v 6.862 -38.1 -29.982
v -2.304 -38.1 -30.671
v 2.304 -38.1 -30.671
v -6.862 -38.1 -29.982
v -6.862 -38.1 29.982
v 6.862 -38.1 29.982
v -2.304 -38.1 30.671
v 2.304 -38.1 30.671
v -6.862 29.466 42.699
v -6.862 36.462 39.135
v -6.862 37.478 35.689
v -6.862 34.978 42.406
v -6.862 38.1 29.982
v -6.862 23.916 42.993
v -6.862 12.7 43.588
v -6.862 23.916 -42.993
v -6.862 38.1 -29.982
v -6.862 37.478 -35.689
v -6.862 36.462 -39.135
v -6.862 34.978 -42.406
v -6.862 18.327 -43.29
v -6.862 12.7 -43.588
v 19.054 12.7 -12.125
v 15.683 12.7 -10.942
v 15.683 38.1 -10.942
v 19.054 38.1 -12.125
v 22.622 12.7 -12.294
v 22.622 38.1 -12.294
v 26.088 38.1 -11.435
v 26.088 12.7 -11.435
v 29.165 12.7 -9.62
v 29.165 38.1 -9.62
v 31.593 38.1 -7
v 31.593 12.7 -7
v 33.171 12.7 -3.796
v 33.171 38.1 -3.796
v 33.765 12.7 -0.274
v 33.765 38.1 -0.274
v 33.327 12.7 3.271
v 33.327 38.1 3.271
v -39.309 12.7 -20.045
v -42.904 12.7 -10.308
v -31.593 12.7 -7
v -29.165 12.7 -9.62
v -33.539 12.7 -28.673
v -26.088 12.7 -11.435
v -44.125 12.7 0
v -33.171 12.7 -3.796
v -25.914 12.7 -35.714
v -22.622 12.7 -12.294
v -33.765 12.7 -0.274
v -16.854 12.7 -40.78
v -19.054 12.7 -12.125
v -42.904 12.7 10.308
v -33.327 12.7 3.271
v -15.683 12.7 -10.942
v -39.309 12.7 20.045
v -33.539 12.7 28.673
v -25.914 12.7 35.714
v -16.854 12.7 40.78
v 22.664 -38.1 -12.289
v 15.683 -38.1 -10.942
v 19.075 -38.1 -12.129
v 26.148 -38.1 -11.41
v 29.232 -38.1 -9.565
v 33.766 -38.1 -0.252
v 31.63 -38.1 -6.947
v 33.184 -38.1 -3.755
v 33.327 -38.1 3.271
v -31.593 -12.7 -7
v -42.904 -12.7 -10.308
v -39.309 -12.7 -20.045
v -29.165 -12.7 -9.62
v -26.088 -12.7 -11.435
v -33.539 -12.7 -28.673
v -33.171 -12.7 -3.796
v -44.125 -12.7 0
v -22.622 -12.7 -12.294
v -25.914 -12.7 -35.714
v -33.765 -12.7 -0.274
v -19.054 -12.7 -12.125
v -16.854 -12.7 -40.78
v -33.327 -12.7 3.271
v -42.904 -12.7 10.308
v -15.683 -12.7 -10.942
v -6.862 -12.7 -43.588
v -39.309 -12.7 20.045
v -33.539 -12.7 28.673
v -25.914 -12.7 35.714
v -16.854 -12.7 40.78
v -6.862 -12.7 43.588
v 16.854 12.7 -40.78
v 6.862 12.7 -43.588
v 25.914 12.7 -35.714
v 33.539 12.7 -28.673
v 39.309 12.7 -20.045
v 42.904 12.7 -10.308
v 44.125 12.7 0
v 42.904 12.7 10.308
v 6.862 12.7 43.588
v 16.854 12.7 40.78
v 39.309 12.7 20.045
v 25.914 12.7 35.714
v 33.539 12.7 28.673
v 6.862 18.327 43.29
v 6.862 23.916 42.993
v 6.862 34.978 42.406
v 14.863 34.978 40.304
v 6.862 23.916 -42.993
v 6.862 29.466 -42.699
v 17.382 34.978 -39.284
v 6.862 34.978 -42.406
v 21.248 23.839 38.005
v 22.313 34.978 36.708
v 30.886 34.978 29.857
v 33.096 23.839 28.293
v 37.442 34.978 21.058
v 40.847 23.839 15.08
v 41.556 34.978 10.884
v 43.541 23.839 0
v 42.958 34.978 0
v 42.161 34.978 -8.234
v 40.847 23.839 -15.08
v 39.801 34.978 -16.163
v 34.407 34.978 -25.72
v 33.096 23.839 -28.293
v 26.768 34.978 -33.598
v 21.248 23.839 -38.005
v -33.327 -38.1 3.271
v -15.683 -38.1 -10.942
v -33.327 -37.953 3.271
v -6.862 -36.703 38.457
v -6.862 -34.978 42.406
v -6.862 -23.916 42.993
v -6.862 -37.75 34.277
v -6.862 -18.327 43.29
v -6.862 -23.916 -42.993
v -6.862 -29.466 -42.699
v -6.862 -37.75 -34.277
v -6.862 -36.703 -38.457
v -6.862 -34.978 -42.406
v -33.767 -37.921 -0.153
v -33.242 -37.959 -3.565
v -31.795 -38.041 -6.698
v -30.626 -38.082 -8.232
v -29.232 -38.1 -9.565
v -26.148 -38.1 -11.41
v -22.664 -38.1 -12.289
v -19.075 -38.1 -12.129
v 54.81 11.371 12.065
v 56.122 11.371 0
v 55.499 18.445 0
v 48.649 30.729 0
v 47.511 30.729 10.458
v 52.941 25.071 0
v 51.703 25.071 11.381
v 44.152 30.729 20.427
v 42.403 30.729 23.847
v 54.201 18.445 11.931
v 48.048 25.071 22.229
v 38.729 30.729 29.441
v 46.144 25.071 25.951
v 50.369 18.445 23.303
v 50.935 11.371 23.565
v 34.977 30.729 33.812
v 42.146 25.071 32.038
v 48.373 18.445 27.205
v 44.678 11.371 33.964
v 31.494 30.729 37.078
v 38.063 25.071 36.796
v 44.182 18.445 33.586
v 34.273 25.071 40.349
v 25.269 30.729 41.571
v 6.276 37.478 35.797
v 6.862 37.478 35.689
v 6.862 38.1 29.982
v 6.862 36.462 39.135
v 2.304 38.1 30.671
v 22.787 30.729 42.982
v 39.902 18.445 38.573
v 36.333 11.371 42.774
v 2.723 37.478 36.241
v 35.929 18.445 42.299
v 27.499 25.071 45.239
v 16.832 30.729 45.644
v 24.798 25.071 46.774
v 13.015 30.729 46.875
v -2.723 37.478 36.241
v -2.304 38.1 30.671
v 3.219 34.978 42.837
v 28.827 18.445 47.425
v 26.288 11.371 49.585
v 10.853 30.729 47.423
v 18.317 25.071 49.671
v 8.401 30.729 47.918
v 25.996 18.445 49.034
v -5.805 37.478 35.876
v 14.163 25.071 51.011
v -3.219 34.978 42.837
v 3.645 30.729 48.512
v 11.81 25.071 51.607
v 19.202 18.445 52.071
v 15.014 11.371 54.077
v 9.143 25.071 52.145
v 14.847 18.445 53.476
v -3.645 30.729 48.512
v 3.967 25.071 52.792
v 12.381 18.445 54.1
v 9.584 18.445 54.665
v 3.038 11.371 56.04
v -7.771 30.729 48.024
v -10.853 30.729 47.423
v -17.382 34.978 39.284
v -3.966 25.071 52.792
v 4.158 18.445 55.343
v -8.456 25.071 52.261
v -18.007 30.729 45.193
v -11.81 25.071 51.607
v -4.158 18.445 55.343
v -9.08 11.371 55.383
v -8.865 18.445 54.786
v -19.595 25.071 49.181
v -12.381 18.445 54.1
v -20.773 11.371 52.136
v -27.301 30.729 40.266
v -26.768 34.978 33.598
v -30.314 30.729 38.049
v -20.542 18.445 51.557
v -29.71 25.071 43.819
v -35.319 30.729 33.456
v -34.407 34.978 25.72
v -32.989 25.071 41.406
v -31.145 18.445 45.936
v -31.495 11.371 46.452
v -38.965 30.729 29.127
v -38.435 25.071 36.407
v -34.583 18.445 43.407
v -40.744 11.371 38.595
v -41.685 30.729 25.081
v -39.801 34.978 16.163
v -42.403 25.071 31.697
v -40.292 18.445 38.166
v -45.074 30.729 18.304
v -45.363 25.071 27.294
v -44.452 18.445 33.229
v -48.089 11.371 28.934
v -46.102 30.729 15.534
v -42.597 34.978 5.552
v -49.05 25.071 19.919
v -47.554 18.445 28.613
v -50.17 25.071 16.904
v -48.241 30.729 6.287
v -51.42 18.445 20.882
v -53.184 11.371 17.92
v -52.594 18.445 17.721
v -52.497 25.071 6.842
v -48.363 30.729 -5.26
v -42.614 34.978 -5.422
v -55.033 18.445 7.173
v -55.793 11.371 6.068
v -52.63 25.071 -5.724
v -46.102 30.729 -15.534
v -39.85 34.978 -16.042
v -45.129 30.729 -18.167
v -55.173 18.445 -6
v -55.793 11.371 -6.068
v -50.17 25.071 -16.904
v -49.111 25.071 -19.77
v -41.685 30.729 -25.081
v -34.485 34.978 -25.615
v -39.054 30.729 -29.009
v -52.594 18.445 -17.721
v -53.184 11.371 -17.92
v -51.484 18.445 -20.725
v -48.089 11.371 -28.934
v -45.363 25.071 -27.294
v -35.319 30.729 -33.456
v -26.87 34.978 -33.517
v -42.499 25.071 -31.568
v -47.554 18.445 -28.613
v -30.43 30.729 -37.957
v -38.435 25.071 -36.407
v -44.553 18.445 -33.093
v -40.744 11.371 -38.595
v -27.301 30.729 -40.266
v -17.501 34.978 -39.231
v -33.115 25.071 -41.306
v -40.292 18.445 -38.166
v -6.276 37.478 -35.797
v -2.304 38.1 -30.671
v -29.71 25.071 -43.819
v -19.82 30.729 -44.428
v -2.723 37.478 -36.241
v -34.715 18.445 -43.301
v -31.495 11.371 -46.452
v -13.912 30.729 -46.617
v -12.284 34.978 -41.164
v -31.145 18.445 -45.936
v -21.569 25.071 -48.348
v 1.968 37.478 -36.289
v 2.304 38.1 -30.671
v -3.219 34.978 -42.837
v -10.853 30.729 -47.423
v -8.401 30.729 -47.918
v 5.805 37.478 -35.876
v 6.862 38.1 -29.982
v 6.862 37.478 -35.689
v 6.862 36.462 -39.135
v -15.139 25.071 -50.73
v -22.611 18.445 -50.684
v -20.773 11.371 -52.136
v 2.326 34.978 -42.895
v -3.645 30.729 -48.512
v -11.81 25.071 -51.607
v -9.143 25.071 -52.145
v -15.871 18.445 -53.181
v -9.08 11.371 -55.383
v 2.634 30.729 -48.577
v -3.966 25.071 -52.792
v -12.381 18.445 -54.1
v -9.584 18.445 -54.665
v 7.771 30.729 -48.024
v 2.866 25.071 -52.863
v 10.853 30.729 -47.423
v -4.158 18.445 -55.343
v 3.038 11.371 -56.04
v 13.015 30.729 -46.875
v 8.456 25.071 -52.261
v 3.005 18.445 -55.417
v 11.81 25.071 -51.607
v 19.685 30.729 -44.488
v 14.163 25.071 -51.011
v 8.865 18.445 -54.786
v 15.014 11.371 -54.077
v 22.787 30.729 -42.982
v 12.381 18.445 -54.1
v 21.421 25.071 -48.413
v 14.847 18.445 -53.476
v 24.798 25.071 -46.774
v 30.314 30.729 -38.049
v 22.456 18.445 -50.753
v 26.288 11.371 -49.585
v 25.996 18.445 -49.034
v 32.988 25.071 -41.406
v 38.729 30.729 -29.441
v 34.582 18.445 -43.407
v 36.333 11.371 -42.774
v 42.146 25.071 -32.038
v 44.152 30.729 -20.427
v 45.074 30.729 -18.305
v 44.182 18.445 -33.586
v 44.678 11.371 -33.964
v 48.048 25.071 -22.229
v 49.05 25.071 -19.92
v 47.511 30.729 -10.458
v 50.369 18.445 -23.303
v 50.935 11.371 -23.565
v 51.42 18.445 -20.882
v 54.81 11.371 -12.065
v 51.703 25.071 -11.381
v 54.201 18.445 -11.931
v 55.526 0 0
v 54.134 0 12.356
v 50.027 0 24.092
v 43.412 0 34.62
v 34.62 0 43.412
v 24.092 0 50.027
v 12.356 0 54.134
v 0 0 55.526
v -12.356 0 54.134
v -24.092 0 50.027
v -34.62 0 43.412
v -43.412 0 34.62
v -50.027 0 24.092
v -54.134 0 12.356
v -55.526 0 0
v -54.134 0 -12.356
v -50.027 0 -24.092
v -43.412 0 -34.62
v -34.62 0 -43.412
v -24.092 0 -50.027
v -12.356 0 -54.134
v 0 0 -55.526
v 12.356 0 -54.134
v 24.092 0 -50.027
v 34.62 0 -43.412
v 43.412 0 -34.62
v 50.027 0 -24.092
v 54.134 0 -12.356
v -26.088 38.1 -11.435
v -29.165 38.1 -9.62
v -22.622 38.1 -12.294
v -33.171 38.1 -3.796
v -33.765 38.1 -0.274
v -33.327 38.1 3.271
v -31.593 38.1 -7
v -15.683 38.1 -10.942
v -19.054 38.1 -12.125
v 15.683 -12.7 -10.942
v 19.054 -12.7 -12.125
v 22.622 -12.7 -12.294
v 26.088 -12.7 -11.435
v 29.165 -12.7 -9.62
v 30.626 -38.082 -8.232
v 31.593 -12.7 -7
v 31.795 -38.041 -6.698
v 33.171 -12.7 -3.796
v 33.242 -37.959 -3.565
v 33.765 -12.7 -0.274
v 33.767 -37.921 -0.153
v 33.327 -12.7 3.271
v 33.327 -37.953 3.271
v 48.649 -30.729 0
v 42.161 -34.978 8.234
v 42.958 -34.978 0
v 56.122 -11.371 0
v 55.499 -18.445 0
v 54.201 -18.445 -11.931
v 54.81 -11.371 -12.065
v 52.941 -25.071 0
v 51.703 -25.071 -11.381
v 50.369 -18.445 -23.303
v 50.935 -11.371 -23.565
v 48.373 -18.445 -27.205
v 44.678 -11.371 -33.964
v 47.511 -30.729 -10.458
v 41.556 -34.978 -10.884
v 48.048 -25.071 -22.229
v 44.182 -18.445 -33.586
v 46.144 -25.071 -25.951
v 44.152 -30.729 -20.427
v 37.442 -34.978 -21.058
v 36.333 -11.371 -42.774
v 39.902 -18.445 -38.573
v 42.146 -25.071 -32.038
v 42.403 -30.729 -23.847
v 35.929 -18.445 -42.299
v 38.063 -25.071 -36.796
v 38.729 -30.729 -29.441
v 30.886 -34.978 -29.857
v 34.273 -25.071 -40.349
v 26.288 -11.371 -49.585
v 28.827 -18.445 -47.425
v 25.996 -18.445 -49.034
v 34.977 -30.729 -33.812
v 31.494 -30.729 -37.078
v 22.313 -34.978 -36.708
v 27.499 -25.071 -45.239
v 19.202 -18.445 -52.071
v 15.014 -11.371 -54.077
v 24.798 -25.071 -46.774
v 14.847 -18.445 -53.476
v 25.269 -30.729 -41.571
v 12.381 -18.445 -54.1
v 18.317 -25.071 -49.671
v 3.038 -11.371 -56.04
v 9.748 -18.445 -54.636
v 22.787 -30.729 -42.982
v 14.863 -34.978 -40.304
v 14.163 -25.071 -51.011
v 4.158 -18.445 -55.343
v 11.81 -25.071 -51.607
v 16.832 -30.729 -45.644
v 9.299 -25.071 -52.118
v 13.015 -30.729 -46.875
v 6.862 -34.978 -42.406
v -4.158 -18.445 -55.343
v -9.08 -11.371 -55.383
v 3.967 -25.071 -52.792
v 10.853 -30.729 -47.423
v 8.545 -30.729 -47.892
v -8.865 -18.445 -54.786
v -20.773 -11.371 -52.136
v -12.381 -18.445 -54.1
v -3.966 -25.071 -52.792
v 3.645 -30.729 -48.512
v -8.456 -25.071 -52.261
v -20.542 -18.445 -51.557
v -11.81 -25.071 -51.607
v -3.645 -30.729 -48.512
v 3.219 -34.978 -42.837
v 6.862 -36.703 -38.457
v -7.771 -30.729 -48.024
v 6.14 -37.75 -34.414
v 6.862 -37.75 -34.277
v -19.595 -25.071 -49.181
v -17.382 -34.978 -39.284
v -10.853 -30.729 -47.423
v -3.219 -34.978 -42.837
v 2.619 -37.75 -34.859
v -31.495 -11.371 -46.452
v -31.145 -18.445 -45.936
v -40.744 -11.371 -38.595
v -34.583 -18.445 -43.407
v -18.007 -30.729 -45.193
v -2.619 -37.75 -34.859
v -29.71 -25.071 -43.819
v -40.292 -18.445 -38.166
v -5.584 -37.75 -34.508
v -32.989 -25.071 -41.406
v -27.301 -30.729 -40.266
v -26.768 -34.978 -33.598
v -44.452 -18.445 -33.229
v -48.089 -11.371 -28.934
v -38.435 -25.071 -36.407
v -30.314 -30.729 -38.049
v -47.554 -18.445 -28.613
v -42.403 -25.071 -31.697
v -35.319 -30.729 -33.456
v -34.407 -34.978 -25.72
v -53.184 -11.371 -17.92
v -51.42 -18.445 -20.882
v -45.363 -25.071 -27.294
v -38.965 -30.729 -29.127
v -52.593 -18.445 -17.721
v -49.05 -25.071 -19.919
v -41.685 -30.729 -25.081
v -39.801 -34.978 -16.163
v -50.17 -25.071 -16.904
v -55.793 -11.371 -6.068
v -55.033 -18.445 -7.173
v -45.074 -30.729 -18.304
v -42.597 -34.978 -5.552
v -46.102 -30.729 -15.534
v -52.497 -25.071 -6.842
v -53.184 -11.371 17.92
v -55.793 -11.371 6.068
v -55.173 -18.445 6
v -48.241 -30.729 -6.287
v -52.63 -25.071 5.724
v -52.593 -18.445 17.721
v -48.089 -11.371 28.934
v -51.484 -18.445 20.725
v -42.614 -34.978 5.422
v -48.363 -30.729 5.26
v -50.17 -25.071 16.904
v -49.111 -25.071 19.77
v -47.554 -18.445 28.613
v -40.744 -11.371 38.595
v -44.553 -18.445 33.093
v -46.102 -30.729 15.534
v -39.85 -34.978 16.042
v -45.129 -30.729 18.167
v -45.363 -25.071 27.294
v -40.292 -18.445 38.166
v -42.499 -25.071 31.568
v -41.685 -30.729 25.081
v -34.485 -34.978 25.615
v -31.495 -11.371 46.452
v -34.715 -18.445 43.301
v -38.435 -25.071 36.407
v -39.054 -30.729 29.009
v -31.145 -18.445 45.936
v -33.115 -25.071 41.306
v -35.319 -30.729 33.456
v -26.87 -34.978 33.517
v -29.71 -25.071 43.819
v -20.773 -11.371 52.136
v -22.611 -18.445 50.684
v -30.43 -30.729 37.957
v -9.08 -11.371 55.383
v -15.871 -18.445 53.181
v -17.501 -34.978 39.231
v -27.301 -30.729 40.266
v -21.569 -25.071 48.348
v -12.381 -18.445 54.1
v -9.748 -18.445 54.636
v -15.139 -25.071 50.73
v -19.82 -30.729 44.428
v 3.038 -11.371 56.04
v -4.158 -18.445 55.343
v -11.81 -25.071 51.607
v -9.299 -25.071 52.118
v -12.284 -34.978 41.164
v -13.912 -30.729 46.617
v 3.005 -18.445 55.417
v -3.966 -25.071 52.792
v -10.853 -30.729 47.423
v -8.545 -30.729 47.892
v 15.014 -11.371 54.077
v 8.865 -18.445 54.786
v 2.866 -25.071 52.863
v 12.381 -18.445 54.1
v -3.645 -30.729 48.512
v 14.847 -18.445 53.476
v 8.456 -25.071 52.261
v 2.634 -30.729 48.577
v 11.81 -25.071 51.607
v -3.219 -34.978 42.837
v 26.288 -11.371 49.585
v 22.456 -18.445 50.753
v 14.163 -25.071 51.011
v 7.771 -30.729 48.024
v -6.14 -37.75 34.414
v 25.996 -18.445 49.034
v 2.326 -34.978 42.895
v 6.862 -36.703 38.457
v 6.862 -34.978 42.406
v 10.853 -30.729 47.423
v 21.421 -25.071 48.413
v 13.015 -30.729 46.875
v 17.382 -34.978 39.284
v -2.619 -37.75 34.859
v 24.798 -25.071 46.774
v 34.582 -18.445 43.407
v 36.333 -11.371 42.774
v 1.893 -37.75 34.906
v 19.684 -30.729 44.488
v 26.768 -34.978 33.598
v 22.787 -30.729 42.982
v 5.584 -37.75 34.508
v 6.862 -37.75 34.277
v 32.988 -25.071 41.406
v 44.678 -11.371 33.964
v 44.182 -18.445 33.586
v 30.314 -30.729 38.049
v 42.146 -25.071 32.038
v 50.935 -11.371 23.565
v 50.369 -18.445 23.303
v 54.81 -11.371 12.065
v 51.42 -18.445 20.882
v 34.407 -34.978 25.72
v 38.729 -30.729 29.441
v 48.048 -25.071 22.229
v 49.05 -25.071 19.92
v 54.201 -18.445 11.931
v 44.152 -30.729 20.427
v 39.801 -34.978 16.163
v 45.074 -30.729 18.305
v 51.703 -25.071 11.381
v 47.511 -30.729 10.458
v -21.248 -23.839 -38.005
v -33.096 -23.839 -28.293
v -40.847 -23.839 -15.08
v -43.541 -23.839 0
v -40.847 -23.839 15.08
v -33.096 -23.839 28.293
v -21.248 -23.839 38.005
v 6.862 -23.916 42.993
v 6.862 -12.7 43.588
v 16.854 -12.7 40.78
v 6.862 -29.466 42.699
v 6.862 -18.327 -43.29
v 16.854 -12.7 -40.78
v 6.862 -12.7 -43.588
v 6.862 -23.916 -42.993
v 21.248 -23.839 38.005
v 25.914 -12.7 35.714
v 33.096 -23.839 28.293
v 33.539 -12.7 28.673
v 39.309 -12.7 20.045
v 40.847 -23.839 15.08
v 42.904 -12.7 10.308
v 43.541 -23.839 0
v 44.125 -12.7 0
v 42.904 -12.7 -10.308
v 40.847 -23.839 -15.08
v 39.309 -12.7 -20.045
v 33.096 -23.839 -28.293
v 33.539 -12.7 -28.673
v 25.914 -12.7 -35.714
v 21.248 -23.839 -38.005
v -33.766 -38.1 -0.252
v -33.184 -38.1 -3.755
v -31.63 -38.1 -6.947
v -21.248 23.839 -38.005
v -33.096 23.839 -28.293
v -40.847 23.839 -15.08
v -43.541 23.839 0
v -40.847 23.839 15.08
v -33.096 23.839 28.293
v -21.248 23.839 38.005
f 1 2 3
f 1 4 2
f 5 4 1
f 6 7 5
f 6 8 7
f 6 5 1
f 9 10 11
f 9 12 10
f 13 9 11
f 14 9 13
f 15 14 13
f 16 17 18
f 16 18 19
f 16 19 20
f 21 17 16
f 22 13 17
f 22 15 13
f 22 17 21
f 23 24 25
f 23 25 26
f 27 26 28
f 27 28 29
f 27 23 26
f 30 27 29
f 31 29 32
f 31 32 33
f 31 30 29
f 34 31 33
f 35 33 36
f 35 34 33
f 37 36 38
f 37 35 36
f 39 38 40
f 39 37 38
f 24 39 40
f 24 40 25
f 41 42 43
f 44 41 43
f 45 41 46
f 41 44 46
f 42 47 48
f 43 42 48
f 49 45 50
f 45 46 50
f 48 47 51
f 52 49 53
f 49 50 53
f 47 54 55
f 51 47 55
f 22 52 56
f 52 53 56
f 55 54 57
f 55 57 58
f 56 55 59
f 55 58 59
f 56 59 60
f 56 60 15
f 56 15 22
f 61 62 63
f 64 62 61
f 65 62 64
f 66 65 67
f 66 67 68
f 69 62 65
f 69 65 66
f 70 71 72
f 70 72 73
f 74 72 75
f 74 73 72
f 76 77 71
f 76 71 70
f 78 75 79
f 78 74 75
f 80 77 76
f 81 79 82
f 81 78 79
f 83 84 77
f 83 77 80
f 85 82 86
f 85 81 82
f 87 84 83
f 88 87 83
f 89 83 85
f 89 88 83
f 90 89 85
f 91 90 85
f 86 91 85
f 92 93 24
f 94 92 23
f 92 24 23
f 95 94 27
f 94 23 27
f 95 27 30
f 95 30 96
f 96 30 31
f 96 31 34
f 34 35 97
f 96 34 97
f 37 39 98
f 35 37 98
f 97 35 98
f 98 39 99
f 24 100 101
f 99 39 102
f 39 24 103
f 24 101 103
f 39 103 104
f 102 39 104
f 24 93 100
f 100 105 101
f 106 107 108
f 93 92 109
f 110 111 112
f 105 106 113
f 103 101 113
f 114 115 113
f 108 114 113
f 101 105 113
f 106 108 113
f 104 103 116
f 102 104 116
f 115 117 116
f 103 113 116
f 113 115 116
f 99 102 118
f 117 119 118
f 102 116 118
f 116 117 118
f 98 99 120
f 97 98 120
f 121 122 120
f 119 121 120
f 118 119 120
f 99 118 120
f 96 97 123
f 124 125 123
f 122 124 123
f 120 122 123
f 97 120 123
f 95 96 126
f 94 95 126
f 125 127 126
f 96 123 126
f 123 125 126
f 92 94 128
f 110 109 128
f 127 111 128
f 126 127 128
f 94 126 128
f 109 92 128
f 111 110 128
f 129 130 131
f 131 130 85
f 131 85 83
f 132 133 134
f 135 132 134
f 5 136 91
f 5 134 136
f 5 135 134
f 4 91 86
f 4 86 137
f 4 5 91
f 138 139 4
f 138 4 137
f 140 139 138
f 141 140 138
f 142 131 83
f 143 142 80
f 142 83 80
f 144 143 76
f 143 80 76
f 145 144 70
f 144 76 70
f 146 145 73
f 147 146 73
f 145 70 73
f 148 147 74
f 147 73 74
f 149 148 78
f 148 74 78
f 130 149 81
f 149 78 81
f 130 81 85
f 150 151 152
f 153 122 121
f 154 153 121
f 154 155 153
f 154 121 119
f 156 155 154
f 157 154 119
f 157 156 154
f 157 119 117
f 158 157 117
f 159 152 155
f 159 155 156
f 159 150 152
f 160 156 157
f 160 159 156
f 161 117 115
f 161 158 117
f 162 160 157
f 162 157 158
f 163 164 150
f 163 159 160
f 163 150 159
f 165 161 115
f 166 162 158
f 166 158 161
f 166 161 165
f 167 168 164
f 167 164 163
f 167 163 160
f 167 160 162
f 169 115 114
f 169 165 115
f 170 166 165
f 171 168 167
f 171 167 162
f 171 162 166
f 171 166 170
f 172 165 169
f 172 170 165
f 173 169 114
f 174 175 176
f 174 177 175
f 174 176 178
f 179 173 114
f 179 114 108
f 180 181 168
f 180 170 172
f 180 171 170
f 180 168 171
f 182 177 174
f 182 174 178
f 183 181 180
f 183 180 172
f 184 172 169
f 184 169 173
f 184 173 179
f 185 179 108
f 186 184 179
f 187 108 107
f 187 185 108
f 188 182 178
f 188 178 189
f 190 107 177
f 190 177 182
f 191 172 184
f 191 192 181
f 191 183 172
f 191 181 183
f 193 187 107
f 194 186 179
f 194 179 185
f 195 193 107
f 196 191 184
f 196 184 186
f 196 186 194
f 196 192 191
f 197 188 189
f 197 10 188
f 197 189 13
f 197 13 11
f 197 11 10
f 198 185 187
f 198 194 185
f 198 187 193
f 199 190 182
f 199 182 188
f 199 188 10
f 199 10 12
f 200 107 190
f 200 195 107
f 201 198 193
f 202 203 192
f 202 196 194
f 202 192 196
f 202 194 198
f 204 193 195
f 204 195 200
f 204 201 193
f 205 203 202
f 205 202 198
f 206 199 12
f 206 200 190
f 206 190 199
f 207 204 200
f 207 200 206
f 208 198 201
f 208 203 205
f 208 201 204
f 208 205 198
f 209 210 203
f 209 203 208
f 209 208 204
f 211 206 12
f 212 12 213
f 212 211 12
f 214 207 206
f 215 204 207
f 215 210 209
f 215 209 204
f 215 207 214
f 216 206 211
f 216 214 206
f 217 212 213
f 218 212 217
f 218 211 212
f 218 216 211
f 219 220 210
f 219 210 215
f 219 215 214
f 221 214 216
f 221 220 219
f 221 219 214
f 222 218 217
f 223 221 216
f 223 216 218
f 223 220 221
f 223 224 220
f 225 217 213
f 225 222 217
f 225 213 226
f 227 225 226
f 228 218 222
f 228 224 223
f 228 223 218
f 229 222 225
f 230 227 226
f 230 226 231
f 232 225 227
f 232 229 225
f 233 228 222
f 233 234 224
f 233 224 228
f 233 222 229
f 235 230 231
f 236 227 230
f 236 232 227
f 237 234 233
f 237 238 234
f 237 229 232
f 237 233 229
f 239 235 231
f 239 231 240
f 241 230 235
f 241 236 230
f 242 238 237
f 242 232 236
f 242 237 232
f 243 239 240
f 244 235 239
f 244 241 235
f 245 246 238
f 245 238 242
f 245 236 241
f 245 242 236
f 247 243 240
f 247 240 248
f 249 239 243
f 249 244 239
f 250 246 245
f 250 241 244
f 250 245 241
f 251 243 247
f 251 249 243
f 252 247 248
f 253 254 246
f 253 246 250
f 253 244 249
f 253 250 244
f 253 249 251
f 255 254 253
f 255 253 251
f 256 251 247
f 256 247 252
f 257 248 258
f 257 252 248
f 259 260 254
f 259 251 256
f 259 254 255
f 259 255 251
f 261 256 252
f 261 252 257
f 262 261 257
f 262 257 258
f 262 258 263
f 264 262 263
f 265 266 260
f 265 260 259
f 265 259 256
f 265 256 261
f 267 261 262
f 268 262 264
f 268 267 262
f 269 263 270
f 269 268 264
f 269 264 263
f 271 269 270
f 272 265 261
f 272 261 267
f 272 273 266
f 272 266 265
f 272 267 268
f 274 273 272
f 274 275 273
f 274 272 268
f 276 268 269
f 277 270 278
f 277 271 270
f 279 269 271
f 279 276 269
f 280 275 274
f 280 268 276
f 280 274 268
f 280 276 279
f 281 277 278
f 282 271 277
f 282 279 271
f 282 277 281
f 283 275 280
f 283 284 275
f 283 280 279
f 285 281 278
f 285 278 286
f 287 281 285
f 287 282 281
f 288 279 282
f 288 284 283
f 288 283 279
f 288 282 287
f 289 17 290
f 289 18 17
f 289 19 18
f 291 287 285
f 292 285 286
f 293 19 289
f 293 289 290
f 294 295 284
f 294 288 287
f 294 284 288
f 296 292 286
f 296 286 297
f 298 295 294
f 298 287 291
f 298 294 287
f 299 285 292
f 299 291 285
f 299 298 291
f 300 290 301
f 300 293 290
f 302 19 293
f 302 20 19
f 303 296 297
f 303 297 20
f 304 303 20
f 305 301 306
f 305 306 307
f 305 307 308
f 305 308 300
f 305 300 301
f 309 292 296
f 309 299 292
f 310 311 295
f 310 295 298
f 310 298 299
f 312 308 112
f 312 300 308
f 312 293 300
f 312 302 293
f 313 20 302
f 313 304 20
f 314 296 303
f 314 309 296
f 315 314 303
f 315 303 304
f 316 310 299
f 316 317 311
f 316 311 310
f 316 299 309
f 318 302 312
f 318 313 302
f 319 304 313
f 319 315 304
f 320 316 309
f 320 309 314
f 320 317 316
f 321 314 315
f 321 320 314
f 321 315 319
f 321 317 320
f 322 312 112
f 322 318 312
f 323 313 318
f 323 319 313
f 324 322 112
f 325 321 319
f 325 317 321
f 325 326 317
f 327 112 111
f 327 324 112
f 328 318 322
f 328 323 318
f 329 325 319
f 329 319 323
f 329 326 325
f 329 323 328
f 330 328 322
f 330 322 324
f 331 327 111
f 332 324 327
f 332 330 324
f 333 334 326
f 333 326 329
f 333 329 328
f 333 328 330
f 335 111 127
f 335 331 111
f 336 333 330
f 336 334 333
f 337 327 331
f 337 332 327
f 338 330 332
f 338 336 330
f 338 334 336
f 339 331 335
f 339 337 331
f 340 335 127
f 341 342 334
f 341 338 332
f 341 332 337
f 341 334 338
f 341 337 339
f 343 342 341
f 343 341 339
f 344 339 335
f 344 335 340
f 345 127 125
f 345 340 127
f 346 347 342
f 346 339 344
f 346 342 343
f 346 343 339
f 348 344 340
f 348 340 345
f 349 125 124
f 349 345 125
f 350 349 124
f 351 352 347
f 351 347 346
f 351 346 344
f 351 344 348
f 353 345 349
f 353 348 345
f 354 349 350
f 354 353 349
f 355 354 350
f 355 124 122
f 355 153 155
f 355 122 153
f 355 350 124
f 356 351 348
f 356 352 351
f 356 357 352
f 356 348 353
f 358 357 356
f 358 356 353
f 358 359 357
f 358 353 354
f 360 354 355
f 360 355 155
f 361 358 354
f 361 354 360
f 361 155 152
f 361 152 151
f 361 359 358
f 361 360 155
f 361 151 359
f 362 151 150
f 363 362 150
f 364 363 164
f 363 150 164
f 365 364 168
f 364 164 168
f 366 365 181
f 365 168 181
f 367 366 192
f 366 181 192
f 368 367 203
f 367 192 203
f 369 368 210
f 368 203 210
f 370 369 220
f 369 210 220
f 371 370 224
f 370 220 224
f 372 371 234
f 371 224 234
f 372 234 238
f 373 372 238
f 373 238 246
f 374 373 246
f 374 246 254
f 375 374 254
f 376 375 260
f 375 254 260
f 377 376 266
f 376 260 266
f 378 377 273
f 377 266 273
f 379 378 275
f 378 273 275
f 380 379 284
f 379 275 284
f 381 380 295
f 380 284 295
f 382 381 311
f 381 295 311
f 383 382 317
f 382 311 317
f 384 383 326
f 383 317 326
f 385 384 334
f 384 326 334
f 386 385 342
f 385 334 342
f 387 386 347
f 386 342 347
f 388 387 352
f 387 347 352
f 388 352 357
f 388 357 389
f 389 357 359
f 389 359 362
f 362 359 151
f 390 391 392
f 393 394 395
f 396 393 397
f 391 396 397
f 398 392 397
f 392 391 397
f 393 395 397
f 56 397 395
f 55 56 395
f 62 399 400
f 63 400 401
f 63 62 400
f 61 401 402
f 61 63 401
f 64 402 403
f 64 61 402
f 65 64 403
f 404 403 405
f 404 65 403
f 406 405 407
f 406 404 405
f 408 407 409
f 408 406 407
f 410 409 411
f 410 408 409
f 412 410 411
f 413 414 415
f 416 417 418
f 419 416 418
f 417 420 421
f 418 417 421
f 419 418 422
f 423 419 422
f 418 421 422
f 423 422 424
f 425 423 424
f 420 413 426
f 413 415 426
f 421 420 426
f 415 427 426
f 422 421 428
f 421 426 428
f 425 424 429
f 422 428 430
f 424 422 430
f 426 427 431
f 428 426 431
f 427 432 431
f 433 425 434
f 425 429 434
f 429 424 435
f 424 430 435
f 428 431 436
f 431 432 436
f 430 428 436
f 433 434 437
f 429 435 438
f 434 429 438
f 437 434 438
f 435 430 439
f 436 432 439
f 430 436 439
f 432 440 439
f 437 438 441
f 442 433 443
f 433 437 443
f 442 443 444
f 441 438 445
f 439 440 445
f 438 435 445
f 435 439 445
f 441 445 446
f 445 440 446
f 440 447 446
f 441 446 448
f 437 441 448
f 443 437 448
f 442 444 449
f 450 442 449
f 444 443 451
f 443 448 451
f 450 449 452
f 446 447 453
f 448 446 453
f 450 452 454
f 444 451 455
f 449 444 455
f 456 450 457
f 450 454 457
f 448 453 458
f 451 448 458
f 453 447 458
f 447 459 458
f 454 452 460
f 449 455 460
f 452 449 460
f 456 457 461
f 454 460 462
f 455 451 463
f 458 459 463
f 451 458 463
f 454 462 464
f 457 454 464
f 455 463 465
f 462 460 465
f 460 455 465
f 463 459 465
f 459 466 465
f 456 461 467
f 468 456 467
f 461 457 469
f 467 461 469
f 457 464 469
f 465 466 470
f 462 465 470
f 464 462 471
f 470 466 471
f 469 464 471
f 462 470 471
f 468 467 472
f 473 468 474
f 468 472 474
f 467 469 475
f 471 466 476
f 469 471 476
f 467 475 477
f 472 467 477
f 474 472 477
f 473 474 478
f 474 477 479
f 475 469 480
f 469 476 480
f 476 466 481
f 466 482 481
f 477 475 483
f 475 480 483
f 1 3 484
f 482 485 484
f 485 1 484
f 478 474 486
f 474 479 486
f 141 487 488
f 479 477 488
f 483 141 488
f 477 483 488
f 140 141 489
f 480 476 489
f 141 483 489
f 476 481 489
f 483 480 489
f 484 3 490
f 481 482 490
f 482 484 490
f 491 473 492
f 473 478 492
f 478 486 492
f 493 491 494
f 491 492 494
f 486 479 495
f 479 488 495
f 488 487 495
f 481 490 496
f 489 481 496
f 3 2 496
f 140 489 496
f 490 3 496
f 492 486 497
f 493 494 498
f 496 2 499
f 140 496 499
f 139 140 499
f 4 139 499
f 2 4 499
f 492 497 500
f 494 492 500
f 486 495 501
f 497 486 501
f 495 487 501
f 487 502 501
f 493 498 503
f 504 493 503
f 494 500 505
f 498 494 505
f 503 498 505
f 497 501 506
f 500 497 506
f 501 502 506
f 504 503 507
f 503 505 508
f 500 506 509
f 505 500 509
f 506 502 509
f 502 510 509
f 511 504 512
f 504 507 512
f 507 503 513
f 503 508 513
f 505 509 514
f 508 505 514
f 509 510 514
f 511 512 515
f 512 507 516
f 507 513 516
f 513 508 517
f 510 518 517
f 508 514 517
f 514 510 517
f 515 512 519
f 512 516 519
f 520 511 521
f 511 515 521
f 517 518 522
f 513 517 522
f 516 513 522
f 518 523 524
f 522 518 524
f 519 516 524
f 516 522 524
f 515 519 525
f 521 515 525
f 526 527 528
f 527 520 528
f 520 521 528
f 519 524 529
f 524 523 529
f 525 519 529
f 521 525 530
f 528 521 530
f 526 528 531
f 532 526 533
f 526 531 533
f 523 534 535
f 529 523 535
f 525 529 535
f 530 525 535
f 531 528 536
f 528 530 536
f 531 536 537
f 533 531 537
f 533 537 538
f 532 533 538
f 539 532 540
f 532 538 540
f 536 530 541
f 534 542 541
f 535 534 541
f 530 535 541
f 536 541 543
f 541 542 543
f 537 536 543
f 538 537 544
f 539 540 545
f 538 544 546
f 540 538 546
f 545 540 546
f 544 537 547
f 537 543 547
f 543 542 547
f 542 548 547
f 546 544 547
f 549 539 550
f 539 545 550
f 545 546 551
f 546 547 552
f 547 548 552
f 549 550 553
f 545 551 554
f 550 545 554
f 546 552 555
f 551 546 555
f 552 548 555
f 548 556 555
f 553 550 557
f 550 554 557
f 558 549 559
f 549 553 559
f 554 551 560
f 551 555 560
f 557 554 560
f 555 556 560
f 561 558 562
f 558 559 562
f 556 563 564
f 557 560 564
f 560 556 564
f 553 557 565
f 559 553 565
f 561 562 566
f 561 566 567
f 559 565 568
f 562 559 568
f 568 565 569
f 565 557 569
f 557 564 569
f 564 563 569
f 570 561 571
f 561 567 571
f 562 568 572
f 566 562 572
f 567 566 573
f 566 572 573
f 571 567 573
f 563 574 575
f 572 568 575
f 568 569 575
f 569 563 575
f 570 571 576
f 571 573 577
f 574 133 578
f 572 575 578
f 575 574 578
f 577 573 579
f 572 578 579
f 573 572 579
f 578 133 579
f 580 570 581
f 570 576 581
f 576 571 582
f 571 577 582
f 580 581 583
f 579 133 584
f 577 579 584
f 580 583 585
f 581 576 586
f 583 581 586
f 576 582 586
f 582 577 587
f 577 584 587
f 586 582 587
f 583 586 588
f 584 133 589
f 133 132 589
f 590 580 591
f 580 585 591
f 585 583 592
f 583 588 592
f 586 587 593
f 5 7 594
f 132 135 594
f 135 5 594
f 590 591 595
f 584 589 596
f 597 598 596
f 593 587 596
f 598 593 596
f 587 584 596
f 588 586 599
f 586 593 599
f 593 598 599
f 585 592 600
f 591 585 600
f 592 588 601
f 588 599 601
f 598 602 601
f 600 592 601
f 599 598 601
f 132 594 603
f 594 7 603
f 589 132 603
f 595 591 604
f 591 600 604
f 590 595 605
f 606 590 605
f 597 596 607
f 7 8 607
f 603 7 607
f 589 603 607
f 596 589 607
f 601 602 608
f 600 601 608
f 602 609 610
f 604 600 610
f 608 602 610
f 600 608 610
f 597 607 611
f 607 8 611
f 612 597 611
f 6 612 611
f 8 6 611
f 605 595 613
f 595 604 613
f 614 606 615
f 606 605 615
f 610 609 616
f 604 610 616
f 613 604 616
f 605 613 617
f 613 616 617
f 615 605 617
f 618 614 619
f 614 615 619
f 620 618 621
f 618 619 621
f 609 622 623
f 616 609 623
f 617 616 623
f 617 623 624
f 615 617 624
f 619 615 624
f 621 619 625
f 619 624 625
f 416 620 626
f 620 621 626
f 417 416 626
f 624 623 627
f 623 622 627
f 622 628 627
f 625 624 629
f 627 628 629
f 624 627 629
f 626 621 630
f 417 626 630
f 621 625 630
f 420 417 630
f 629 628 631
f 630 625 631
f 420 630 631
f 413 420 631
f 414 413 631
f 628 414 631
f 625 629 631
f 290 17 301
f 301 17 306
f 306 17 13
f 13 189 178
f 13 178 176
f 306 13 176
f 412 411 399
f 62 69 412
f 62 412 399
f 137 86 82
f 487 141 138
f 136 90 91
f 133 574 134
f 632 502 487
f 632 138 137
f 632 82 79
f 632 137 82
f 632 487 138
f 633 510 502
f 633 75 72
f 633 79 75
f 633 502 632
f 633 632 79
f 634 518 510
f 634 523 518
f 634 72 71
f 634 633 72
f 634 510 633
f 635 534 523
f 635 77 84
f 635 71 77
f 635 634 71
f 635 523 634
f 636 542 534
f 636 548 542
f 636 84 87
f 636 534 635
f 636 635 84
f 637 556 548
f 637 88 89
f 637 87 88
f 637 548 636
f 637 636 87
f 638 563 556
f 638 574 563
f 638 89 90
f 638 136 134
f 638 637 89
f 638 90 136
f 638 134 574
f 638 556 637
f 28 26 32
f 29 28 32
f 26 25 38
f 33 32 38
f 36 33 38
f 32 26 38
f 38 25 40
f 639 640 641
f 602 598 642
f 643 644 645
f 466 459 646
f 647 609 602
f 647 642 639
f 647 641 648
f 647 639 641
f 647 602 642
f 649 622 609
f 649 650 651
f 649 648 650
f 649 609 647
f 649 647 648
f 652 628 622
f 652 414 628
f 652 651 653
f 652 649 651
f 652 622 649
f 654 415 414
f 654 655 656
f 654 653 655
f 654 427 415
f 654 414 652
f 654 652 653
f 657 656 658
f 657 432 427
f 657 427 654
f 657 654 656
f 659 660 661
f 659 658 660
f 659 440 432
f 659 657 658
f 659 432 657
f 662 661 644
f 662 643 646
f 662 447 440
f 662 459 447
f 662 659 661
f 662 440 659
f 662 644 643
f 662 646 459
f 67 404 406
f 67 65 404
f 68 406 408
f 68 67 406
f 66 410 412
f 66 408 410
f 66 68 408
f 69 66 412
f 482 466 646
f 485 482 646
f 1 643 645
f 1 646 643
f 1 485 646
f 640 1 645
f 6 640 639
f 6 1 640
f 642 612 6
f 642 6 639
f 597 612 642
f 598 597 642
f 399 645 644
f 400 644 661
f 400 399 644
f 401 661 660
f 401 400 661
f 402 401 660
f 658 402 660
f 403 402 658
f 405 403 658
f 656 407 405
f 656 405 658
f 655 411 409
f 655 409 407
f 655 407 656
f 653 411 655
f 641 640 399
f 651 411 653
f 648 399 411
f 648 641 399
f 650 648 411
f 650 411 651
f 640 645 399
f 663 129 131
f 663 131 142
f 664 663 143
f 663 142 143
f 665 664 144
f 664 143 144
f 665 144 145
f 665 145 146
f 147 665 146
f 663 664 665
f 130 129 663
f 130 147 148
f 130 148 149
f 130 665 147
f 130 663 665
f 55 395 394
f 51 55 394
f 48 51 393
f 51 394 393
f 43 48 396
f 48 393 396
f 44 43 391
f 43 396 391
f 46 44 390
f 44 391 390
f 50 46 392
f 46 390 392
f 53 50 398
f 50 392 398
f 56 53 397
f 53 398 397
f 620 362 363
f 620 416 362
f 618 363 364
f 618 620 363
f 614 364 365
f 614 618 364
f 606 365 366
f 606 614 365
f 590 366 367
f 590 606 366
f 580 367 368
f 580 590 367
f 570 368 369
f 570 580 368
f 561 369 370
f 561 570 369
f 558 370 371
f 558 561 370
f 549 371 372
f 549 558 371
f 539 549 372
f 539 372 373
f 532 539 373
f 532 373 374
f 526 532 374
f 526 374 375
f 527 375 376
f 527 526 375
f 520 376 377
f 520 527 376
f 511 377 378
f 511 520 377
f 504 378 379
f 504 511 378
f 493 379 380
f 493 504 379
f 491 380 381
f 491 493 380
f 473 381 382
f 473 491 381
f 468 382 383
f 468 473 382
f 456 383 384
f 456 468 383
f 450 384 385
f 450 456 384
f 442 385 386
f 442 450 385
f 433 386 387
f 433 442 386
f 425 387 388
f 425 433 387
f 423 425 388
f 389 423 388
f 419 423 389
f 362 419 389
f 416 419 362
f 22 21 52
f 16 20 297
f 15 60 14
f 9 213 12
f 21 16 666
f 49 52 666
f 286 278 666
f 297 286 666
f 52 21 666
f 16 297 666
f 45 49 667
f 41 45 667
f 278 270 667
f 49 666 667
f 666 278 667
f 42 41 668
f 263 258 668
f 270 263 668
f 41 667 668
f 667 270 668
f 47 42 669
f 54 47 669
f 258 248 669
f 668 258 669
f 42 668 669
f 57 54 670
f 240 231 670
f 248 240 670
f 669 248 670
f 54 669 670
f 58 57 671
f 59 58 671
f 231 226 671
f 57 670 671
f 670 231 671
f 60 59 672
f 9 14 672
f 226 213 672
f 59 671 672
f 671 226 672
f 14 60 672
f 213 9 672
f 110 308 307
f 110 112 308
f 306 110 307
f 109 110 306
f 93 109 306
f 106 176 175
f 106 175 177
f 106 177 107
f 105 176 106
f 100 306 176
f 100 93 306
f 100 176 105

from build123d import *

# Parameters (mm, degrees)
F0_R         = 55.5262746105
F1_DEPTH     = 38.1
F1_TAPER     = -3
F2_DEPTH     = 38.1
F3_DEPTH     = 12.7
F4_DEPTH     = 38.1
F5_S5_R      = 12.3526687507
F5_T6_DEPTH  = 90
F5_S7_R      = 12.3526687507
F5_T8_DEPTH  = 90
F5_S13_R     = 12.3526687507
F5_T14_DEPTH = 90
F5_S15_R     = 12.3526687507
F5_T16_DEPTH = 90


# Not quite as in the source:
# - a fillet or chamfer that OpenCascade refuses, or shapes differently, is made with other operations: its cross-section is extruded or revolved along the edge and cut away or added
# - two fillets or chamfers of one size are made in one step


with BuildPart() as f1:
    # F0 (on Front) → F1 (new body, symmetric)
    with BuildSketch(Plane.XZ):
        Circle(F0_R)
        with BuildLine():
            ThreePointArc((6.861501839, 44.2620349836), (34.0113180152, 29.1451230097), (44.790712747, 0))
            ThreePointArc((44.790712747, 0), (34.0113180152, -29.1451230097), (6.861501839, -44.2620349836))
            Line((6.861501839, -44.2620349836), (6.861501839, -46.4376546443))
            Line((6.861501839, -46.4376546443), (-6.8615009077, -46.4376546443))
            Line((-6.8615009077, -46.4376546443), (-6.8615009077, -44.262035128))
            ThreePointArc((-6.8615009077, -44.262035128), (-44.790712747, 0), (-6.8615009077, 44.262035128))
            Line((-6.8615009077, 44.262035128), (-6.8615009077, 48.6431419849))
            Line((-6.8615009077, 48.6431419849), (6.861501839, 48.6431419849))
            Line((6.861501839, 48.6431419849), (6.861501839, 44.2620349836))
        make_face(mode=Mode.SUBTRACT)
        with BuildLine():
            ThreePointArc((-6.8615009077, 44.262035128), (4.712e-07, 44.790712747), (6.861501839, 44.2620349836))
            Line((6.861501839, 44.2620349836), (6.861501839, 48.6431419849))
            Line((6.861501839, 48.6431419849), (-6.8615009077, 48.6431419849))
            Line((-6.8615009077, 48.6431419849), (-6.8615009077, 44.262035128))
        make_face()
        with BuildLine():
            Line((6.861501839, -46.4376546443), (6.861501839, -44.2620349836))
            ThreePointArc((6.861501839, -44.2620349836), (4.712e-07, -44.790712747), (-6.8615009077, -44.262035128))
            Line((-6.8615009077, -44.262035128), (-6.8615009077, -46.4376546443))
            Line((-6.8615009077, -46.4376546443), (6.861501839, -46.4376546443))
        make_face()
    extrude(amount=F1_DEPTH, both=True, taper=F1_TAPER)

    # F0 (on Front) → F2 (join, symmetric)
    with BuildSketch(Plane.XZ):
        with BuildLine():
            Line((6.861501839, -44.2620349836), (6.861501839, 44.2620349836))
            ThreePointArc((6.861501839, 44.2620349836), (4.712e-07, 44.790712747), (-6.8615009077, 44.262035128))
            Line((-6.8615009077, 44.262035128), (-6.8615009077, -44.262035128))
            ThreePointArc((-6.8615009077, -44.262035128), (4.712e-07, -44.790712747), (6.861501839, -44.2620349836))
        make_face()
    extrude(amount=F2_DEPTH, both=True)

    # F0 (on Front) → F3 (join, symmetric)
    with BuildSketch(Plane.XZ):
        with BuildLine():
            Line((-6.8615009077, -44.262035128), (-6.8615009077, 44.262035128))
            ThreePointArc((-6.8615009077, 44.262035128), (-44.790712747, 0), (-6.8615009077, -44.262035128))
        make_face()
        with BuildLine():
            ThreePointArc((-15.6834311783, -10.942174576), (-29.1647493256, -9.6196886086), (-33.3272889256, 3.270934813))
            Line((-33.3272889256, 3.270934813), (-15.6834311783, -10.942174576))
        make_face(mode=Mode.SUBTRACT)
        with BuildLine():
            ThreePointArc((6.861501839, -44.2620349836), (34.0113180152, -29.1451230097), (44.790712747, 0))
            ThreePointArc((44.790712747, 0), (34.0113180152, 29.1451230097), (6.861501839, 44.2620349836))
            Line((6.861501839, 44.2620349836), (6.861501839, -44.2620349836))
        make_face()
        with BuildLine():
            Line((15.6834311783, -10.942174576), (33.3272889256, 3.270934813))
            ThreePointArc((33.3272889256, 3.270934813), (29.1647493256, -9.6196886086), (15.6834311783, -10.942174576))
        make_face(mode=Mode.SUBTRACT)
    extrude(amount=F3_DEPTH, both=True)

    # F0 (on Front) → F4 (join, symmetric)
    with BuildSketch(Plane.XZ):
        with BuildLine():
            Line((-15.6834311783, -10.942174576), (-33.3272889256, 3.270934813))
            ThreePointArc((-33.3272889256, 3.270934813), (-29.1647493256, -9.6196886086), (-15.6834311783, -10.942174576))
        make_face()
        with BuildLine():
            ThreePointArc((15.6834311783, -10.942174576), (29.1647493256, -9.6196886086), (33.3272889256, 3.270934813))
            Line((33.3272889256, 3.270934813), (15.6834311783, -10.942174576))
        make_face()
    extrude(amount=F4_DEPTH, both=True)

    # F5: fillet of radius 25.4 on 2 edges, made by hand


with BuildPart() as f5_tool2:
    # F5_s3 → F5_t4 (revolve)
    with BuildSketch(Plane.XY):
        with BuildLine():
            ThreePointArc((30.7569958191, 38.1), (49.1815048428, 30.1842062226), (56.1221860018, 11.3706667114))
            Line((56.1221860018, 11.3706667114), (57.5230110012, 38.1))
            Line((57.5230110012, 38.1), (30.7569958191, 38.1))
        make_face()
    revolve(axis=Axis((0, 38.1, 0), (0, -1, 0)))

    # F5_s5 → F5_t6 (cut, symmetric)
    with BuildSketch(Plane.XZ.offset(-16.4)):
        with Locations((-21.415554765, 0)):
            Circle(F5_S5_R)
    extrude(amount=F5_T6_DEPTH, both=True, mode=Mode.SUBTRACT)

    # F5_s7 → F5_t8 (cut, symmetric)
    with BuildSketch(Plane.XZ.offset(-16.4)):
        with Locations((21.415554765, 0)):
            Circle(F5_S7_R)
    extrude(amount=F5_T8_DEPTH, both=True, mode=Mode.SUBTRACT)


with BuildPart() as f1_1:
    add(f1.part)

    # F5_t1: cut F5_tool2
    add(f5_tool2.part, mode=Mode.SUBTRACT)


with BuildPart() as f5_tool10:
    # F5_s11 → F5_t12 (revolve)
    with BuildSketch(Plane.XY):
        with BuildLine():
            ThreePointArc((56.1221860018, -11.3706667114), (49.1815048428, -30.1842062226), (30.7569958191, -38.1))
            Line((30.7569958191, -38.1), (57.5230110012, -38.1))
            Line((57.5230110012, -38.1), (56.1221860018, -11.3706667114))
        make_face()
    revolve(axis=Axis((0, -38.1, 0), (0, 1, 0)))

    # F5_s13 → F5_t14 (cut, symmetric)
    with BuildSketch(Plane.XZ.offset(16.4)):
        with Locations((21.415554765, 0)):
            Circle(F5_S13_R)
    extrude(amount=F5_T14_DEPTH, both=True, mode=Mode.SUBTRACT)

    # F5_s15 → F5_t16 (cut, symmetric)
    with BuildSketch(Plane.XZ.offset(16.4)):
        with Locations((-21.415554765, 0)):
            Circle(F5_S15_R)
    extrude(amount=F5_T16_DEPTH, both=True, mode=Mode.SUBTRACT)


with BuildPart() as f1_2:
    add(f1_1.part)

    # F5_t9: cut F5_tool10
    add(f5_tool10.part, mode=Mode.SUBTRACT)


solid = f1_2.part
